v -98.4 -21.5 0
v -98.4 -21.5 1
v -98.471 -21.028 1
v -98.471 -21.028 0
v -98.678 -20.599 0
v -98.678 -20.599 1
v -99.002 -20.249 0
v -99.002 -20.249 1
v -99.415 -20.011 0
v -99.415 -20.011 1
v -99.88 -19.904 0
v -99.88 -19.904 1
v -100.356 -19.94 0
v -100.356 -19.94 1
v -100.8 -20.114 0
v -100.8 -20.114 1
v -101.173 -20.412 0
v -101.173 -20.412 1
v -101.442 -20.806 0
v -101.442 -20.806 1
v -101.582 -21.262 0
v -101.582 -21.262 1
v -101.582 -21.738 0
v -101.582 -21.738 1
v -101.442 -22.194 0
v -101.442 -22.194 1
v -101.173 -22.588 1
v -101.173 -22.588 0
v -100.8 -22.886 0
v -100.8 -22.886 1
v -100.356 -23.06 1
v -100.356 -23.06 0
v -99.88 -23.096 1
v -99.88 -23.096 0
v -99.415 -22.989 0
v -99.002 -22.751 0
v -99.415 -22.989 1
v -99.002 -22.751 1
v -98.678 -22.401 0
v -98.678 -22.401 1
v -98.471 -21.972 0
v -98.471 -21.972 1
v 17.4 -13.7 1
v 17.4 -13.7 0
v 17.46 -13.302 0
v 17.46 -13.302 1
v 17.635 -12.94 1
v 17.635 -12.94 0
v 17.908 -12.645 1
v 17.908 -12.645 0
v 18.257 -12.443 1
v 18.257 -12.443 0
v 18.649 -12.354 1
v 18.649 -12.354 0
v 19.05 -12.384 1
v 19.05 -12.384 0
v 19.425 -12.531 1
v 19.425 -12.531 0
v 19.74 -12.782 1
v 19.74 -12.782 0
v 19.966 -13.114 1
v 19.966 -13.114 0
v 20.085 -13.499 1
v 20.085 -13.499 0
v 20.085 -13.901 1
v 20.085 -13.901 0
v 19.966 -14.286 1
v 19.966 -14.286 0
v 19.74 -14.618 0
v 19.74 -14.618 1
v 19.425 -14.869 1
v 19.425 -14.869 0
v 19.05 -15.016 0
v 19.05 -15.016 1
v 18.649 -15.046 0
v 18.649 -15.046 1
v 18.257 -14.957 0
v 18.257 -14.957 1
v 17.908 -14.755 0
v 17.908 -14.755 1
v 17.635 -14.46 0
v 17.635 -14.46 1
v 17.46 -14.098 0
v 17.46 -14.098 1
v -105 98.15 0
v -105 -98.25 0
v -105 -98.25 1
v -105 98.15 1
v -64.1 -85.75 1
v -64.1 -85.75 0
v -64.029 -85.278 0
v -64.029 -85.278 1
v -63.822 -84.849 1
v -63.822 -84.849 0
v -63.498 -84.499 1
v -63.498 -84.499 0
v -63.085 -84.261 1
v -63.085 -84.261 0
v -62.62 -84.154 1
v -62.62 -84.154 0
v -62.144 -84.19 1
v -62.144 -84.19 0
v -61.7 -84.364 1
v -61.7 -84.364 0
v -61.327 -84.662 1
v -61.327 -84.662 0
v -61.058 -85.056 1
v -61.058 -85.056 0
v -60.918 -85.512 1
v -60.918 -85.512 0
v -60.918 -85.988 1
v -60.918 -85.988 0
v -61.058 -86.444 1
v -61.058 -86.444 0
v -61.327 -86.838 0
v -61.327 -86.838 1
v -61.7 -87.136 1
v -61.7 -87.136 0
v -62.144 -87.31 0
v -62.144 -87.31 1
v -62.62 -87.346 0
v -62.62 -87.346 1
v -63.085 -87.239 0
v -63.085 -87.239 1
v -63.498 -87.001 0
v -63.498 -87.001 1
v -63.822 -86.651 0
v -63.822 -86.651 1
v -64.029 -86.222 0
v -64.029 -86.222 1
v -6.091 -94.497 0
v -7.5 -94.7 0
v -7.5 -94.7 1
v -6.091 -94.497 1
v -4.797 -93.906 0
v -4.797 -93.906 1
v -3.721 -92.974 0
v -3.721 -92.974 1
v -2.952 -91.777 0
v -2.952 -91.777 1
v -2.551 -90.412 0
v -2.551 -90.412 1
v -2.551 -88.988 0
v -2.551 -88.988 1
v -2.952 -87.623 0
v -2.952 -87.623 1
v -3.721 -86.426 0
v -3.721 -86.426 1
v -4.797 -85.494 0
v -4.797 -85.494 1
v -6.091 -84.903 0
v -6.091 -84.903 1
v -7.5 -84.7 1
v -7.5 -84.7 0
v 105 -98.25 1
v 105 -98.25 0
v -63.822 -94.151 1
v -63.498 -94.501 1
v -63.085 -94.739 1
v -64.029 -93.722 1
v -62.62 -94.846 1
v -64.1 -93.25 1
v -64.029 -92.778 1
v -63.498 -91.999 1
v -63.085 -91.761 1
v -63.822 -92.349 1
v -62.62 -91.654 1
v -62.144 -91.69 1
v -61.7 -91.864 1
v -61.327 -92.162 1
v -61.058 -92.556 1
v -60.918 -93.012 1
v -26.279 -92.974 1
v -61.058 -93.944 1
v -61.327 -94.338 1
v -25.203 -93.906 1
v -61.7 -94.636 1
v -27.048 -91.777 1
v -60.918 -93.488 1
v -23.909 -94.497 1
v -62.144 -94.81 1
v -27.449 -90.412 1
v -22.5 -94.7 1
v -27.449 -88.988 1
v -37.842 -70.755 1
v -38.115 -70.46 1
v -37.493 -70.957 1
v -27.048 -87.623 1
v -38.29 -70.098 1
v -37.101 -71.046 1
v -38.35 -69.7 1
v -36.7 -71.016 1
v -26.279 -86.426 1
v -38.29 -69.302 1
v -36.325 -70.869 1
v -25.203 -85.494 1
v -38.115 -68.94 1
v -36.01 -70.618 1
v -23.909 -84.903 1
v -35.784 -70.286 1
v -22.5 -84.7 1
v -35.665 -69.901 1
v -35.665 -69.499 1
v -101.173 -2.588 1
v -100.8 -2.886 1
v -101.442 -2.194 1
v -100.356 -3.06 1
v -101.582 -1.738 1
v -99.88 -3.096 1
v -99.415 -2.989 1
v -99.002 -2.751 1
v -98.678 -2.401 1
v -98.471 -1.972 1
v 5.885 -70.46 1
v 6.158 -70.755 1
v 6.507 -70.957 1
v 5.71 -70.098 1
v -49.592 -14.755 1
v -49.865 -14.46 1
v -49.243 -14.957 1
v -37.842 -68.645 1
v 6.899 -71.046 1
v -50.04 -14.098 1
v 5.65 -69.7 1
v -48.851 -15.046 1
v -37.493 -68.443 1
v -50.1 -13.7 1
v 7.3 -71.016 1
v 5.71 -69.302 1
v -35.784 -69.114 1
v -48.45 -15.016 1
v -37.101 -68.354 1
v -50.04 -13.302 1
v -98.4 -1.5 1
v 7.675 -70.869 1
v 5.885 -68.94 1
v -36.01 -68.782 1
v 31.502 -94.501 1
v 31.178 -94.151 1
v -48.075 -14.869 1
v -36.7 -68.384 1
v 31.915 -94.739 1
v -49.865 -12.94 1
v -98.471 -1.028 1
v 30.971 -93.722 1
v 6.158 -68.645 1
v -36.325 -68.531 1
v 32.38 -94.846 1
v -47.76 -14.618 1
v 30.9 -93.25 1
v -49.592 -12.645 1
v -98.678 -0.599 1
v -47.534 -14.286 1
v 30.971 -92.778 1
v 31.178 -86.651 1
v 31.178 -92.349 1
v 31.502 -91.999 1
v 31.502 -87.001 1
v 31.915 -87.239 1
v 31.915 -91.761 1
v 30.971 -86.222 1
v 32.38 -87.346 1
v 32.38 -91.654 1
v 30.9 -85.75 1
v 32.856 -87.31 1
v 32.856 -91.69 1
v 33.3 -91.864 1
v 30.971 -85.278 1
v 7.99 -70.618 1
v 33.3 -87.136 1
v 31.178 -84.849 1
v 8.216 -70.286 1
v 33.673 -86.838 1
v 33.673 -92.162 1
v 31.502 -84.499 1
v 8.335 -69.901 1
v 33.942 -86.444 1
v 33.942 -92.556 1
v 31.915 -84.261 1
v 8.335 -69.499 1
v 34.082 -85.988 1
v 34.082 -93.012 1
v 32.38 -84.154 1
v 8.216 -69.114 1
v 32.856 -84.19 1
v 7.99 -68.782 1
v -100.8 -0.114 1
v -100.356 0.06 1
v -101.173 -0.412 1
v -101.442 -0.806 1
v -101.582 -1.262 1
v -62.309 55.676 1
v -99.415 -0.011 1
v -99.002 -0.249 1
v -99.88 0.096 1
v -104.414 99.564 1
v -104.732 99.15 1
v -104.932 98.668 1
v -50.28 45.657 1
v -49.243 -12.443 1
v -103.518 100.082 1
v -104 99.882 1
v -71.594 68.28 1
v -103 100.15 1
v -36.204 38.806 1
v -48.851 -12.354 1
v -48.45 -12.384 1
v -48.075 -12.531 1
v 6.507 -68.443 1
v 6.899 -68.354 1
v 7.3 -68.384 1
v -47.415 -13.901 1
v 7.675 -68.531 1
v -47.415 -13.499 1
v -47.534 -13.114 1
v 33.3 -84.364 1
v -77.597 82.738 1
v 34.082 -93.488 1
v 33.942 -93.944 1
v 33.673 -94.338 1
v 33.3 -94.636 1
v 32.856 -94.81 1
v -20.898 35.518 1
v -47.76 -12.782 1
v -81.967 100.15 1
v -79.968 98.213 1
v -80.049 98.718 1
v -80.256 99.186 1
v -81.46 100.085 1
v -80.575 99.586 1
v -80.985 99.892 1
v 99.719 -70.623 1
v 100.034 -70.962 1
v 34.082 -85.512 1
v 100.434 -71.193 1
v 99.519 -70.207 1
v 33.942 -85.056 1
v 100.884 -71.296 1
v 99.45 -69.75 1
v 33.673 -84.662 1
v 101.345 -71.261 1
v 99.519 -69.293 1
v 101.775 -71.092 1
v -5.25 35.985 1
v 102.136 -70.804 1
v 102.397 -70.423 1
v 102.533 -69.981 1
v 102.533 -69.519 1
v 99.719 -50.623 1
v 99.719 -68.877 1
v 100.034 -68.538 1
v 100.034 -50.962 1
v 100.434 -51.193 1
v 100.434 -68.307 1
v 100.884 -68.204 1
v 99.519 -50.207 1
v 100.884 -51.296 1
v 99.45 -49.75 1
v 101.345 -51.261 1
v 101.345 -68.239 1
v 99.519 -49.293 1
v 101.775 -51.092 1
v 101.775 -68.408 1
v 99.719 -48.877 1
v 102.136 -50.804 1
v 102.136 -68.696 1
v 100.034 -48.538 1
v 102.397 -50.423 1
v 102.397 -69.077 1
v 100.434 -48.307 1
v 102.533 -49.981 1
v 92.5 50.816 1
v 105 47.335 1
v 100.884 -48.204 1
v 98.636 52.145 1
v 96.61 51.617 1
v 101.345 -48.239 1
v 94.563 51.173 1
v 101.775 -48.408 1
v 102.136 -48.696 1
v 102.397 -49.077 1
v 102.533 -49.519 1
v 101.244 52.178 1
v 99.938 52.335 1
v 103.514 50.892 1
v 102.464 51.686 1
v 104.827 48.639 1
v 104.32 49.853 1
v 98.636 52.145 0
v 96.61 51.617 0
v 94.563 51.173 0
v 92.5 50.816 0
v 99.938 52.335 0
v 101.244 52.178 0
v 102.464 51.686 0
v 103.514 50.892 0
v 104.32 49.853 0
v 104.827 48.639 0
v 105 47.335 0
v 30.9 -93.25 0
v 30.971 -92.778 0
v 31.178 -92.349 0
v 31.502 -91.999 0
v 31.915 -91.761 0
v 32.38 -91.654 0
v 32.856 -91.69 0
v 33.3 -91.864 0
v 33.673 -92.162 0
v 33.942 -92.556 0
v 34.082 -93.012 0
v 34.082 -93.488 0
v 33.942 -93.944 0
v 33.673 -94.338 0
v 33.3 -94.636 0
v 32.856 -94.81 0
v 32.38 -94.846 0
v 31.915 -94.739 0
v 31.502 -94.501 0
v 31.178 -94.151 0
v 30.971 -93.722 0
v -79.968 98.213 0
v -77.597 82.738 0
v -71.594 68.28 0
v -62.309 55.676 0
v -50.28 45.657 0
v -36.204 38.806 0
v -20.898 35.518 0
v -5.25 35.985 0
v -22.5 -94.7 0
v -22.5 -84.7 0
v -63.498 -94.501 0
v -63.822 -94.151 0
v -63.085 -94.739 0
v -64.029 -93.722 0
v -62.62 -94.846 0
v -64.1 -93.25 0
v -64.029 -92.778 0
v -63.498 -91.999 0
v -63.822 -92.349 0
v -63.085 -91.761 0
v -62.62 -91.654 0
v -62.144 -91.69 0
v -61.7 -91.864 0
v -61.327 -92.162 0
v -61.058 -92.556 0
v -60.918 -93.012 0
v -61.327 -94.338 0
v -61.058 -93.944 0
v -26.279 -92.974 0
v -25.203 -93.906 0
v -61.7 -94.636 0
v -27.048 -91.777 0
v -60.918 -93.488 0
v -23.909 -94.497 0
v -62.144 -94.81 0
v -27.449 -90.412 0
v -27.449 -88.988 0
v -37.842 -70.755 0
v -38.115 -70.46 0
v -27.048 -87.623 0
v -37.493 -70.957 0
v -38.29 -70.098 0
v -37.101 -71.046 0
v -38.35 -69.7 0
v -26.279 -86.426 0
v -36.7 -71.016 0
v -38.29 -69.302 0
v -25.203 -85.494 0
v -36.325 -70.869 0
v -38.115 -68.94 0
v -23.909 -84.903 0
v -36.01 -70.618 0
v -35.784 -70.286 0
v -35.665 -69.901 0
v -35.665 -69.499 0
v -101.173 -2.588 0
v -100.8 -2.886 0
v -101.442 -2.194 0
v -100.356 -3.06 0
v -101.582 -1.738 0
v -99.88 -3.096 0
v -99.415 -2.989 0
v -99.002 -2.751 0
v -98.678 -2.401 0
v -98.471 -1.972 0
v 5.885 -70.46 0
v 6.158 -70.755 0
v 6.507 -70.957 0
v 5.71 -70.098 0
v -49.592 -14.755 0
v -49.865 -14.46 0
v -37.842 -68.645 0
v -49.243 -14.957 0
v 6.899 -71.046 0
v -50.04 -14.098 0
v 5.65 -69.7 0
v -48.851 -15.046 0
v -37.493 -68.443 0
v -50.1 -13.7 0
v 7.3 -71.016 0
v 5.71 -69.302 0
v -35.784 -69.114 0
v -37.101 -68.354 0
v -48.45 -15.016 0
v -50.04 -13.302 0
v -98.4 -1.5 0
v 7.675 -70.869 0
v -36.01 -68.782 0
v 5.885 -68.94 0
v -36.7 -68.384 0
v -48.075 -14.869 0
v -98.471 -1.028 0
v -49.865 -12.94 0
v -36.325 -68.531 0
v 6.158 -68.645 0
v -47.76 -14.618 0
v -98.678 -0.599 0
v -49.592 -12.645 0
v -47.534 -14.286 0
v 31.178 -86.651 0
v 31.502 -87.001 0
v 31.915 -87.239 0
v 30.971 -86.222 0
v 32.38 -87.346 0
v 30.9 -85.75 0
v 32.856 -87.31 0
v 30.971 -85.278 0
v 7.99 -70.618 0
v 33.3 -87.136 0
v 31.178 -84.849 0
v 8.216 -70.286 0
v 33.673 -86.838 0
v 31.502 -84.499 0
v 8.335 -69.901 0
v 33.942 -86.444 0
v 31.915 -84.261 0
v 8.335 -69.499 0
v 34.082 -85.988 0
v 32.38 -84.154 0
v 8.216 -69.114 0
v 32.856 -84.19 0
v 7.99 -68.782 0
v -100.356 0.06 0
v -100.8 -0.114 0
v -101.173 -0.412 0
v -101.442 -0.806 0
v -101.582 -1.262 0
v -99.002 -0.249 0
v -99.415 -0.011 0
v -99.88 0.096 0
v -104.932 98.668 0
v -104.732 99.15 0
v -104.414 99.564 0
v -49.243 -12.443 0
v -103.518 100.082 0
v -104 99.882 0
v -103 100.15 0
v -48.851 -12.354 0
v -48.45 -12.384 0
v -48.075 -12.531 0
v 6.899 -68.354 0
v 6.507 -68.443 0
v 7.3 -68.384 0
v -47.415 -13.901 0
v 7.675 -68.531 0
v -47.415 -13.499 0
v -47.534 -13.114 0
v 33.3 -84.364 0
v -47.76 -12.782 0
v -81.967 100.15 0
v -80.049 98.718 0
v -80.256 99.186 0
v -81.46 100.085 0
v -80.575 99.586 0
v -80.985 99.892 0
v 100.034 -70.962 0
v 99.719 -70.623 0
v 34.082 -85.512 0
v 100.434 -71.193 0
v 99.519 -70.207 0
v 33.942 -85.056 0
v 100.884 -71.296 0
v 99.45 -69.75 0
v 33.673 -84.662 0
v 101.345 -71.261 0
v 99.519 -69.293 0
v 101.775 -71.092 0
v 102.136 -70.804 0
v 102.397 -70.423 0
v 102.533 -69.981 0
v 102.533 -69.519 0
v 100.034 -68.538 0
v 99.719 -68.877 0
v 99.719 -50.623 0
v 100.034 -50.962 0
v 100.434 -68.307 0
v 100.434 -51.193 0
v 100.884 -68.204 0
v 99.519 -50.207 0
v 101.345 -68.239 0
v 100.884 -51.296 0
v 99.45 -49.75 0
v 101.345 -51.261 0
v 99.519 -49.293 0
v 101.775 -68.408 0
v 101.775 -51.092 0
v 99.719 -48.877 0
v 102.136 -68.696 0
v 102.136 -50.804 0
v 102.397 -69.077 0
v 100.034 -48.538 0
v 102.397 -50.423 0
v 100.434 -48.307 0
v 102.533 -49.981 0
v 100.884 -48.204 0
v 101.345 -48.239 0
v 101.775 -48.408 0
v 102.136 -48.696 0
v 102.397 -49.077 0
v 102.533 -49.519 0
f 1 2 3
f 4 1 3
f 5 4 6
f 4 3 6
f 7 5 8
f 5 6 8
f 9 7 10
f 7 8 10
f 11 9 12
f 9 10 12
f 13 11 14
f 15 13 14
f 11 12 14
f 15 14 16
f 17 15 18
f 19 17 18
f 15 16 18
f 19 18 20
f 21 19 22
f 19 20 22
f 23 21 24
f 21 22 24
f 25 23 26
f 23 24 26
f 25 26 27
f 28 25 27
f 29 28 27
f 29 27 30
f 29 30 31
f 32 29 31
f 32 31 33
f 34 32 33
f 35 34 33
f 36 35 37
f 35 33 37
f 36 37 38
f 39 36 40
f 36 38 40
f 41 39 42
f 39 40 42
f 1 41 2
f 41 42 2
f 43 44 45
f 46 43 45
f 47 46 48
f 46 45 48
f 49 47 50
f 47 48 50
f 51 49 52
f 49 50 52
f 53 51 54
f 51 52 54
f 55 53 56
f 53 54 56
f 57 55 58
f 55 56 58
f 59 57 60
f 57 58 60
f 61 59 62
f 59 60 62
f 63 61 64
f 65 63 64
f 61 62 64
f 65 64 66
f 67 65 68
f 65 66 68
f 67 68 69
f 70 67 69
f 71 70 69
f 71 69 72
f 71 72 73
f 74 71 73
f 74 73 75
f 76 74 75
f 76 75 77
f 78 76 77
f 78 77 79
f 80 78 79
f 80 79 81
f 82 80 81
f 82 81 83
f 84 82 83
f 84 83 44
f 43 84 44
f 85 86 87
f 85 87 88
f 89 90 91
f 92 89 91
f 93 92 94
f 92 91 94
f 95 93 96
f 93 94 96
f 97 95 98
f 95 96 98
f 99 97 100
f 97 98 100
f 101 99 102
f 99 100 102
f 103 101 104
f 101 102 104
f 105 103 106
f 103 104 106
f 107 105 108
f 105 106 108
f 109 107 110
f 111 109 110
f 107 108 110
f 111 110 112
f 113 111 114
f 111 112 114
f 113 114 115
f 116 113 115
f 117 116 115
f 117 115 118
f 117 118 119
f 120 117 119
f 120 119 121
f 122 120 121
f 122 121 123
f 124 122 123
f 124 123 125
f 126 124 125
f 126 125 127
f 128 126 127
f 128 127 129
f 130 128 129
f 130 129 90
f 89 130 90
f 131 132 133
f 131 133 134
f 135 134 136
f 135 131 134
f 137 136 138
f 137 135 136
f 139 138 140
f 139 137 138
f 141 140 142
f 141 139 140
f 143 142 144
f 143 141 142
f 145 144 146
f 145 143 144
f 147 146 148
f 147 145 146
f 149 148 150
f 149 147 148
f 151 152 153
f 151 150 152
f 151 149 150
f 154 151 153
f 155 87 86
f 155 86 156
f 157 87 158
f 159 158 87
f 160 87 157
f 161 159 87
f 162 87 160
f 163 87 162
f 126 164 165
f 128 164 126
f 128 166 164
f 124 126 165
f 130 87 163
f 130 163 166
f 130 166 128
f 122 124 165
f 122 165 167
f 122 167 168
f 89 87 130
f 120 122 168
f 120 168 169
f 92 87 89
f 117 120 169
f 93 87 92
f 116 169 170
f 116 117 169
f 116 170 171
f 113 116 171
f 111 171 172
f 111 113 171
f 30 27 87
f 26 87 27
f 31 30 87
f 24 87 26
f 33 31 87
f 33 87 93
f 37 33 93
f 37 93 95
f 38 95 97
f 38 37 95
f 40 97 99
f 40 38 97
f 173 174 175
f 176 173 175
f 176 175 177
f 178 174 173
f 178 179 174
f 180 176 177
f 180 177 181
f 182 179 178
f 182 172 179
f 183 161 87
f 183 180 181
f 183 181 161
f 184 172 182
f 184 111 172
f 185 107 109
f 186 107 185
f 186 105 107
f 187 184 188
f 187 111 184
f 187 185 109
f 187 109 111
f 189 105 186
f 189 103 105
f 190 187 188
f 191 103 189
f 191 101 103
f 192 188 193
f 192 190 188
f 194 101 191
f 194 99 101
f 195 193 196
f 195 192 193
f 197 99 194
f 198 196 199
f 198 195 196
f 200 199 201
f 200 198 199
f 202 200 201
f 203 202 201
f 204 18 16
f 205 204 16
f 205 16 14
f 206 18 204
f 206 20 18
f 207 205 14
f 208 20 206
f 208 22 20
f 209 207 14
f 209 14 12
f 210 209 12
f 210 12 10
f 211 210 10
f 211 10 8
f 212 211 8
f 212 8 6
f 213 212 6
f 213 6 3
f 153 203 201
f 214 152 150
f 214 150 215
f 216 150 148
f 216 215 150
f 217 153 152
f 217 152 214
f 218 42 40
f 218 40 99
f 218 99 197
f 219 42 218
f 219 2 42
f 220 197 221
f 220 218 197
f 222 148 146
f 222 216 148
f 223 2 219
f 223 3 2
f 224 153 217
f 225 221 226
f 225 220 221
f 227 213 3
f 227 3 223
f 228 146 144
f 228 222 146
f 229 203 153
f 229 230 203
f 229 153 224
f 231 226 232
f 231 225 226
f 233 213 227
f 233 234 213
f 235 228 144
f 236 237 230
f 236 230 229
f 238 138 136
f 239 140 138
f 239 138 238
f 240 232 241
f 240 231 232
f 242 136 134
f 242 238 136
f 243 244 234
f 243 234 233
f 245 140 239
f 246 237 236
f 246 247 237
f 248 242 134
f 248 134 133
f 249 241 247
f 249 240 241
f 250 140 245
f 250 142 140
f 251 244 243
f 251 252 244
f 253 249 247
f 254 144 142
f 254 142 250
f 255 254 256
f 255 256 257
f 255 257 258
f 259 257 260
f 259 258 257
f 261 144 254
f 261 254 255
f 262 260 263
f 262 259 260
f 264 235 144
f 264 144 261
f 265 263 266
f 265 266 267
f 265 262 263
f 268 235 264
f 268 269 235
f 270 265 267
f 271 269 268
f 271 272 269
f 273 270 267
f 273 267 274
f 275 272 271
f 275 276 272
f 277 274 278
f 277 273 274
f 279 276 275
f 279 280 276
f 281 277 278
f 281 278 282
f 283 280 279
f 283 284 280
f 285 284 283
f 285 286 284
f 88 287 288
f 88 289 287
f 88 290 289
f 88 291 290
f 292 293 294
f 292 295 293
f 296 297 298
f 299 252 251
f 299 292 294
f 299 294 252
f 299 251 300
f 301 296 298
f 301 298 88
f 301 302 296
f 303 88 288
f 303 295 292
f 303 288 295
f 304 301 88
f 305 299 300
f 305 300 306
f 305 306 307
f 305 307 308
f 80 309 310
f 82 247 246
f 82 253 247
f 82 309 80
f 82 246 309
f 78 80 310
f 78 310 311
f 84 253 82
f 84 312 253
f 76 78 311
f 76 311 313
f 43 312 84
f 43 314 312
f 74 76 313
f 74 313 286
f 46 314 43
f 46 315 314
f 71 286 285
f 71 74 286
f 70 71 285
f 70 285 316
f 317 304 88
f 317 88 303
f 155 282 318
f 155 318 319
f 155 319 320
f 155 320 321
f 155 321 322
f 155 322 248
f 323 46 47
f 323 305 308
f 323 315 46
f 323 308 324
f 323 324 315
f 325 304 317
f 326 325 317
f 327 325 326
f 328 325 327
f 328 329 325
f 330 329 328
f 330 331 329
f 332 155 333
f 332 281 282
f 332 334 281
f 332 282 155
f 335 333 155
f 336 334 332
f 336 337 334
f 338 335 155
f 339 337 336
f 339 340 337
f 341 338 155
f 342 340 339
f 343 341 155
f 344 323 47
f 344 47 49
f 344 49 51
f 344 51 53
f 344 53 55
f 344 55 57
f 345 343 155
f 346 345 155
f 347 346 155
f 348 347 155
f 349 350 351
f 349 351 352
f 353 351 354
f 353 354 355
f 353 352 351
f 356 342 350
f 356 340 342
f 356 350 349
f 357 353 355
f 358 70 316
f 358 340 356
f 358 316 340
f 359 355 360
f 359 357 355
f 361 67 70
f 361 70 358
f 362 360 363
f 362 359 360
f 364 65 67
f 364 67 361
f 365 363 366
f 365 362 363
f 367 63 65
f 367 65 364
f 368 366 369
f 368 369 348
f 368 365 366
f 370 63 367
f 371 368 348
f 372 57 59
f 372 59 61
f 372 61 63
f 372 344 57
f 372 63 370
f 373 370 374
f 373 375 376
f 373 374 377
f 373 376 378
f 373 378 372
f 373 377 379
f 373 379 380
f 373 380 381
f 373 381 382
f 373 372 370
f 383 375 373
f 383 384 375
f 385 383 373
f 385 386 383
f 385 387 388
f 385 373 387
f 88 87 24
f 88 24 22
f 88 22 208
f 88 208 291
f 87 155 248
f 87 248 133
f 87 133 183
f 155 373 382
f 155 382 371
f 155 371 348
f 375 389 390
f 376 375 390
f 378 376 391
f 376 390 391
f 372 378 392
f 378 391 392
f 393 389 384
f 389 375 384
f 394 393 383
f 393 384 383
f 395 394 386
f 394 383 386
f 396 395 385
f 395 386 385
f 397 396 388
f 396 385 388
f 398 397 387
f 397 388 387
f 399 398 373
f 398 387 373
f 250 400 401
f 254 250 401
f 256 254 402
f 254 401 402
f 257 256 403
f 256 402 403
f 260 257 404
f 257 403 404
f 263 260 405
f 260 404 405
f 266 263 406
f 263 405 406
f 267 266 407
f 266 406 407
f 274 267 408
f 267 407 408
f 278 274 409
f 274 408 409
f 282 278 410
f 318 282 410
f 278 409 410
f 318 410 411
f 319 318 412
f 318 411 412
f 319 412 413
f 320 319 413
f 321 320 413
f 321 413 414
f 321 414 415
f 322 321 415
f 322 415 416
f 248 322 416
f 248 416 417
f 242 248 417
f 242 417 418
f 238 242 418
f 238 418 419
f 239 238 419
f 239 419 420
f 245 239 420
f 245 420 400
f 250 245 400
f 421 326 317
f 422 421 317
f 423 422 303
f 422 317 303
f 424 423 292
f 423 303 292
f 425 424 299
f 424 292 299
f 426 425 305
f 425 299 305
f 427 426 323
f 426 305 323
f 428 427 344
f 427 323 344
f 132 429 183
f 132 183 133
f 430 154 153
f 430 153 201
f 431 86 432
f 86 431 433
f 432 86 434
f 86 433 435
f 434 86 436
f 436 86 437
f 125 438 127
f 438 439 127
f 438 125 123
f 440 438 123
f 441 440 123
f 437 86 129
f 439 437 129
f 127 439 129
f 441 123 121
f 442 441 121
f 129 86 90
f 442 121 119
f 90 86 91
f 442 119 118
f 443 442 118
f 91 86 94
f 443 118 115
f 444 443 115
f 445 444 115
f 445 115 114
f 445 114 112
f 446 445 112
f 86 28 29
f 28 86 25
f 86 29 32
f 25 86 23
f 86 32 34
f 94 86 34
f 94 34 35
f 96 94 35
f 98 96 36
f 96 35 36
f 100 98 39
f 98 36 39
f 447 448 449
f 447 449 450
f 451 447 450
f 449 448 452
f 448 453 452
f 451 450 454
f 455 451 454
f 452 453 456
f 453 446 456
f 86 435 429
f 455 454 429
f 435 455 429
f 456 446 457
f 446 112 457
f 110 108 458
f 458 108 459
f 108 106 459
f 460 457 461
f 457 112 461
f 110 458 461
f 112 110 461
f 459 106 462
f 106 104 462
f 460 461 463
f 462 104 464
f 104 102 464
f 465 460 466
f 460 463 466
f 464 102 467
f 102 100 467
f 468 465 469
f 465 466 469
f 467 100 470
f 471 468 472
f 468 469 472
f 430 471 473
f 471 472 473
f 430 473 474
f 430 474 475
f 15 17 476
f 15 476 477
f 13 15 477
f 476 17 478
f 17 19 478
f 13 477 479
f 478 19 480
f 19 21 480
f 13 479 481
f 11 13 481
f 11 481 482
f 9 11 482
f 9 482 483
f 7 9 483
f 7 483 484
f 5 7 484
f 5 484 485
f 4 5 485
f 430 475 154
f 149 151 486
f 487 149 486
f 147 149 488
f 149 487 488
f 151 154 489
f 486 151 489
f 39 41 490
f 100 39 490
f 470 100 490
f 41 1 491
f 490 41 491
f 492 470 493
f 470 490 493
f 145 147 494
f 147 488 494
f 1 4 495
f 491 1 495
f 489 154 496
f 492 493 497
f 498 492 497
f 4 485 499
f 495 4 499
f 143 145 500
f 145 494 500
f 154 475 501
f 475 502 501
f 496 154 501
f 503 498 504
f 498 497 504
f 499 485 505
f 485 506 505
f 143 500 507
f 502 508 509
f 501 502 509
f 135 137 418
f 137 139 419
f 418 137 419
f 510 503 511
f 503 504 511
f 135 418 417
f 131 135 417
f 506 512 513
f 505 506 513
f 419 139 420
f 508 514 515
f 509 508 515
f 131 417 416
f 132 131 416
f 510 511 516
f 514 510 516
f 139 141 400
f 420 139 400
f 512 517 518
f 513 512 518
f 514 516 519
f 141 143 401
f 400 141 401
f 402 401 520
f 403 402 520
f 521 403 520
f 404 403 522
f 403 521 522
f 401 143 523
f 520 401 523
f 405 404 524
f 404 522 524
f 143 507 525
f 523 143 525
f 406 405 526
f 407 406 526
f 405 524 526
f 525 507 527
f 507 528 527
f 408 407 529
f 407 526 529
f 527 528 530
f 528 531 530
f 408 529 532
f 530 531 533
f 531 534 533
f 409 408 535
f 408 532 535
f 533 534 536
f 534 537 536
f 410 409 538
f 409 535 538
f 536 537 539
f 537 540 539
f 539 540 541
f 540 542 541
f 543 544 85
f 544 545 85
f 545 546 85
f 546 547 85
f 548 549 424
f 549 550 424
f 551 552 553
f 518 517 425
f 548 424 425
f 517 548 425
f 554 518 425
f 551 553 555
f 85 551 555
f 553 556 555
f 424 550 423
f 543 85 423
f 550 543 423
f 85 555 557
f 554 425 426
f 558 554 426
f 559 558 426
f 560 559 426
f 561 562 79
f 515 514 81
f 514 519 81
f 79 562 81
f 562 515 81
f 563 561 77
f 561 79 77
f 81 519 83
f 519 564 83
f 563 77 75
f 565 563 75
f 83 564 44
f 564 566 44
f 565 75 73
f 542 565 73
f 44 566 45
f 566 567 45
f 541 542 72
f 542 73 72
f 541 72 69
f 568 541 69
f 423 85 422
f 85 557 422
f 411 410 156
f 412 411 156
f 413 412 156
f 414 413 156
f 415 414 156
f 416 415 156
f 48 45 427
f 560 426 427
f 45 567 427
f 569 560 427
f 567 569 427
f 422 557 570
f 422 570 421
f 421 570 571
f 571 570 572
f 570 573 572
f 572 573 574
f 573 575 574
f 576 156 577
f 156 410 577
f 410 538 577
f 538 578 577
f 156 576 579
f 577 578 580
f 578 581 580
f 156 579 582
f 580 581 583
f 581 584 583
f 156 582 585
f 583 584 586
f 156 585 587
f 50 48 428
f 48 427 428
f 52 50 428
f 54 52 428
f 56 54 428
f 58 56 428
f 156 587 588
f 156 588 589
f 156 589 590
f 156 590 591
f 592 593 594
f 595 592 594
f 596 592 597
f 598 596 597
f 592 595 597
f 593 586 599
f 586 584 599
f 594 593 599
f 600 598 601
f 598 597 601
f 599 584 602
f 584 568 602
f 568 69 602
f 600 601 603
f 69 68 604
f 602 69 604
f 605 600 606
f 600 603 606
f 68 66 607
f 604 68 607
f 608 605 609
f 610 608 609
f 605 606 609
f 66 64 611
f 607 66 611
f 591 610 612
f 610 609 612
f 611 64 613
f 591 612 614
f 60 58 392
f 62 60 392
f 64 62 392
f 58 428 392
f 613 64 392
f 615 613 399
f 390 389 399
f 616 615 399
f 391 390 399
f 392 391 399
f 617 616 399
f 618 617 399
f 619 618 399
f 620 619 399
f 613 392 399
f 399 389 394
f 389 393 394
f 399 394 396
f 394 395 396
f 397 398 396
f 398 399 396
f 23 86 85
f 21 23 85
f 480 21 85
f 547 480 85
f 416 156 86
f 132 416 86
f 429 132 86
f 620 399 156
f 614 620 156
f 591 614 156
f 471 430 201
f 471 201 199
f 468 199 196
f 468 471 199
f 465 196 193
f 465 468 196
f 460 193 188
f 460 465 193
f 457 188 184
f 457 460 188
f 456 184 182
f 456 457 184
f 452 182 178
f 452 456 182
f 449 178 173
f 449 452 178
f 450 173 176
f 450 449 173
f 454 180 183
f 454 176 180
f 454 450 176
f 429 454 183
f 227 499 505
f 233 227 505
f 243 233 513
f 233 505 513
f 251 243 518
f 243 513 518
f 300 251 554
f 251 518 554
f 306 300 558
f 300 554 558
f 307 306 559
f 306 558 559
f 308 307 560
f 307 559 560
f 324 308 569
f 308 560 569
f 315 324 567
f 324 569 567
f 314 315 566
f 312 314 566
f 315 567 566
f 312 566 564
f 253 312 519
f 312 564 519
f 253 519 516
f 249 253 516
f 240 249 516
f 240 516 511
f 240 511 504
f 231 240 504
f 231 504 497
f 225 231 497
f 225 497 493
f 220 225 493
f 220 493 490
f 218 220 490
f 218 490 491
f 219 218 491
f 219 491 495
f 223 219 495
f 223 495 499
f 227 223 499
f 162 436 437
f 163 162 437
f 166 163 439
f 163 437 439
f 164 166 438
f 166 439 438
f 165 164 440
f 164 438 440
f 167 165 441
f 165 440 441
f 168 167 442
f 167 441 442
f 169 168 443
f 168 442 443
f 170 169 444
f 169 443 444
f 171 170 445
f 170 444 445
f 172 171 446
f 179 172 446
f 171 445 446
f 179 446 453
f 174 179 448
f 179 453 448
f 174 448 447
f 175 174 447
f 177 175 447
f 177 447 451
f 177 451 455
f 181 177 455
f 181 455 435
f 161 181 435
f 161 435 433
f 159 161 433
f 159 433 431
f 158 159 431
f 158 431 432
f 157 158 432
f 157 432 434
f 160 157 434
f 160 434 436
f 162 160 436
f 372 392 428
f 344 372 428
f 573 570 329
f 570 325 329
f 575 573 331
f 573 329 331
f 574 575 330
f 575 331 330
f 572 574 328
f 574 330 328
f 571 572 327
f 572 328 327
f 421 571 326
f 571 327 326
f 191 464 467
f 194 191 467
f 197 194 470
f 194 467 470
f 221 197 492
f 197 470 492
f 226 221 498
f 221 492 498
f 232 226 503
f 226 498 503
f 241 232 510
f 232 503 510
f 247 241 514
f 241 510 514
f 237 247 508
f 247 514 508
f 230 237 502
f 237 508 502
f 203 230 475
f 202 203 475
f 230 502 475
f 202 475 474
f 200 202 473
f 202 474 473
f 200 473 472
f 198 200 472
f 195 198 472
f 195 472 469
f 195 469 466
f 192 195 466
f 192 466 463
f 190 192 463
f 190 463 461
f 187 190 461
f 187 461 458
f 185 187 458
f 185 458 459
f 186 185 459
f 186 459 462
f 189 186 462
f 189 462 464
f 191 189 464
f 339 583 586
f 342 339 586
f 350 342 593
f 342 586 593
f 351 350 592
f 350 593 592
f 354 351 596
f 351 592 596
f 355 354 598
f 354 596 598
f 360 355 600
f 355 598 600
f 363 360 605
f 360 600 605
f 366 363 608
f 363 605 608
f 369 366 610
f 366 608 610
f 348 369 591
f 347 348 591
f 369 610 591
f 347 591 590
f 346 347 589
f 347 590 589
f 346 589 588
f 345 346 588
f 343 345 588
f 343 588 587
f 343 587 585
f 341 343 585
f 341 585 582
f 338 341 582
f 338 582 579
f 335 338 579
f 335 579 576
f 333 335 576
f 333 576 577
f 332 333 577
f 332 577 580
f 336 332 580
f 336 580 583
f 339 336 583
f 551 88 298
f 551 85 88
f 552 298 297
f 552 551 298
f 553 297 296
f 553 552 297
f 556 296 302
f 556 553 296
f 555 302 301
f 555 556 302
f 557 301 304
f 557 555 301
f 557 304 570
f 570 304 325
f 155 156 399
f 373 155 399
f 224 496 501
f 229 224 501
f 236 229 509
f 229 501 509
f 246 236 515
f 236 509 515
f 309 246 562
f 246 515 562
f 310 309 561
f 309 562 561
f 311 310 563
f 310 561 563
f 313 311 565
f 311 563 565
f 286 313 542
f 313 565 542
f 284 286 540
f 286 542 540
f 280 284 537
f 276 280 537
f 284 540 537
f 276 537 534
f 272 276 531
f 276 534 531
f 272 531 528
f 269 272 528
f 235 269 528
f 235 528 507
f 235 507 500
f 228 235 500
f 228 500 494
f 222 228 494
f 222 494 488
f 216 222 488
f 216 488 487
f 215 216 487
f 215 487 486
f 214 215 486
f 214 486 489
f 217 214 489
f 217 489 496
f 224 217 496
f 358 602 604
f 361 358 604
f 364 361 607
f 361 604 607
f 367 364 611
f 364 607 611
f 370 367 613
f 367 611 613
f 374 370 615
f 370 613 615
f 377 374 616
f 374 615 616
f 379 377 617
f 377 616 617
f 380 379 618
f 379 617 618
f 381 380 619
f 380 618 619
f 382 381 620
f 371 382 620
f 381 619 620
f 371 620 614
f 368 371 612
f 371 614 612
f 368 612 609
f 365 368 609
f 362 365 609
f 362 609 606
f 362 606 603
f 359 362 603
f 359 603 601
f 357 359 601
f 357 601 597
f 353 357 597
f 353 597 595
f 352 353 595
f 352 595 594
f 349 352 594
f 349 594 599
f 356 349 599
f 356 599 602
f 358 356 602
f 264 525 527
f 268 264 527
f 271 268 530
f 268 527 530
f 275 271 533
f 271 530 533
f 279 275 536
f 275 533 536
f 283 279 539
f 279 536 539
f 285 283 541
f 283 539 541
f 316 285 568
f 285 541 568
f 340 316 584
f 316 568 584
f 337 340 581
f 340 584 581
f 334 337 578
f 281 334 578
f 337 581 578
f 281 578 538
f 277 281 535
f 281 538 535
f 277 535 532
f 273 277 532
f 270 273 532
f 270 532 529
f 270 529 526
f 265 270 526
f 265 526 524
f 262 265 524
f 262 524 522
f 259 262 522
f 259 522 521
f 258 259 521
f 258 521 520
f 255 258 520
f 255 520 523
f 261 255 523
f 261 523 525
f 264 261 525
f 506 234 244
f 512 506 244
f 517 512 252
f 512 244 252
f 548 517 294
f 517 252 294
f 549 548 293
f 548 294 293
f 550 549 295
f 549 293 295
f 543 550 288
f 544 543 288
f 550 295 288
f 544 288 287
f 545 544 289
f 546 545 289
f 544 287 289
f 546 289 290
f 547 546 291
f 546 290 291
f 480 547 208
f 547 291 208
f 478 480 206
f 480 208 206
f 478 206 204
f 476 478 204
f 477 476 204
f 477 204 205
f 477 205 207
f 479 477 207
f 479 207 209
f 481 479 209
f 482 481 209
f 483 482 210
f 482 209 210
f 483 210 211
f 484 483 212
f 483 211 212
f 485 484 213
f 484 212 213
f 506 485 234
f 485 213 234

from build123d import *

# Parameters (mm, degrees)
SKETCH_1_W           = 210
SKETCH_1_H           = 233
EXTRUDE_1_DEPTH      = 1
SKETCH_2_R           = 65
CUT_EXTRUDE_1_DEPTH  = 2
SKETCH_3_W           = 210
SKETCH_3_H           = 16.25
CUT_EXTRUDE_2_DEPTH  = 2
SKETCH_4_W           = 210
SKETCH_4_H           = 0.1
CUT_EXTRUDE_3_DEPTH  = 2
CUT_EXTRUDE_4_DEPTH  = 2
SKETCH_8_R           = 1.6
CUT_EXTRUDE_6_DEPTH  = 1
SKETCH_12_R          = 1.35
CUT_EXTRUDE_9_DEPTH  = 10
CUT_EXTRUDE_10_DEPTH = 10
FILLET_3_R           = 2
SKETCH_15_R          = 1.6
CUT_EXTRUDE_12_DEPTH = 10
SKETCH_17_R          = 1.55
CUT_EXTRUDE_13_DEPTH = 10
CUT_EXTRUDE_14_DEPTH = 10
FILLET_6_R           = 5
SKETCH_24_W          = 210
SKETCH_24_H          = 18.25
CUT_EXTRUDE_18_DEPTH = 10


with BuildPart() as part:
    # 草图1 → 凸台-拉伸1 (new body)
    with BuildSketch(Plane.XY):
        Rectangle(SKETCH_1_W, SKETCH_1_H)
    extrude(amount=EXTRUDE_1_DEPTH)

    # 草图2 → 切除-拉伸1 (cut)
    with BuildSketch(Plane.XY.offset(1)):
        with Locations((-15, 100.25)):
            Circle(SKETCH_2_R)
    extrude(amount=-CUT_EXTRUDE_1_DEPTH, mode=Mode.SUBTRACT)

    # 草图3 → 切除-拉伸2 (cut)
    with BuildSketch(Plane.XY.offset(1)):
        with Locations((0, 108.375)):
            Rectangle(SKETCH_3_W, SKETCH_3_H)
    extrude(amount=-CUT_EXTRUDE_2_DEPTH, mode=Mode.SUBTRACT)

    # 草图4 → 切除-拉伸3 (cut)
    with BuildSketch(Plane.XY.offset(1)):
        with Locations((0, 100.2)):
            Rectangle(SKETCH_4_W, SKETCH_4_H)
    extrude(amount=-CUT_EXTRUDE_3_DEPTH, mode=Mode.SUBTRACT)

    # 草图5 → 切除-拉伸4 (cut)
    with BuildSketch(Plane.XY.offset(1)):
        with BuildLine():
            Line((4.5, 38.243951908), (95.5, 66.86212795))
            ThreePointArc((95.5, 66.86212795), (105.715966735, 128.460790883), (50.000008252, 100.274034742))
            Line((50.000008252, 100.274034742), (49.999923077, 100.15))
            ThreePointArc((49.999923077, 100.15), (37.375079452, 61.755181486), (4.5, 38.243951908))
        make_face()
    extrude(amount=-CUT_EXTRUDE_4_DEPTH, mode=Mode.SUBTRACT)

    # 草图8 → 切除-拉伸6 (cut)
    with BuildSketch(Plane.XY.offset(1)):
        with Locations((-100, -21.5)):
            Circle(SKETCH_8_R)
        with Locations((-100, -1.5)):
            Circle(SKETCH_8_R)
    extrude(amount=-CUT_EXTRUDE_6_DEPTH, mode=Mode.SUBTRACT)

    # 草图12 → 切除-拉伸9 (cut)
    with BuildSketch(Plane(origin=(0, 0, 0), x_dir=(-1, 0, 0), z_dir=(0, 0, -1))):
        with Locations((-18.75, -13.7)):
            Circle(SKETCH_12_R)
        with Locations((48.75, -13.7)):
            Circle(SKETCH_12_R)
        with Locations((-7, -69.7)):
            Circle(SKETCH_12_R)
        with Locations((37, -69.7)):
            Circle(SKETCH_12_R)
    extrude(amount=-CUT_EXTRUDE_9_DEPTH, mode=Mode.SUBTRACT)

    # 草图13 → 切除-拉伸10 (cut)
    with BuildSketch(Plane(origin=(0, 0, 0), x_dir=(-1, 0, 0), z_dir=(0, 0, -1))):
        with BuildLine():
            Line((7.5, -84.7), (22.5, -84.7))
            ThreePointArc((22.5, -84.7), (27.5, -89.7), (22.5, -94.7))
            Line((22.5, -94.7), (7.5, -94.7))
            ThreePointArc((7.5, -94.7), (2.5, -89.7), (7.5, -84.7))
        make_face()
    extrude(amount=-CUT_EXTRUDE_10_DEPTH, mode=Mode.SUBTRACT)

    # 圆角3
    fillet_3_edges = [part.edges().sort_by_distance(p)[0] for p in [
        (105, 71.527186767, 0.5),
        (-79.999923077, 100.15, 0.5),
        (-105, 100.15, 0.5),
        (105, -116.5, 0.5),
        (-105, -116.5, 0.5),
    ]]
    fillet(fillet_3_edges, radius=FILLET_3_R)

    # 草图15 → 切除-拉伸12 (cut)
    with BuildSketch(Plane(origin=(0, 0, 0), x_dir=(-1, 0, 0), z_dir=(0, 0, -1))):
        with Locations((-32.5, -85.75)):
            Circle(SKETCH_15_R)
        with Locations((-32.5, -93.25)):
            Circle(SKETCH_15_R)
        with Locations((62.5, -85.75)):
            Circle(SKETCH_15_R)
        with Locations((62.5, -93.25)):
            Circle(SKETCH_15_R)
    extrude(amount=-CUT_EXTRUDE_12_DEPTH, mode=Mode.SUBTRACT)

    # 草图17 → 切除-拉伸13 (cut)
    with BuildSketch(Plane(origin=(0, 0, 0), x_dir=(-1, 0, 0), z_dir=(0, 0, -1))):
        with Locations((-101, -49.75)):
            Circle(SKETCH_17_R)
        with Locations((-101, -69.75)):
            Circle(SKETCH_17_R)
    extrude(amount=-CUT_EXTRUDE_13_DEPTH, mode=Mode.SUBTRACT)

    # 草图18 → 切除-拉伸14 (cut)
    with BuildSketch(Plane(origin=(0, 0, 0), x_dir=(-1, 0, 0), z_dir=(0, 0, -1))):
        with BuildLine():
            Line((-92.5, 50.815700167), (5.25, 35.985410217))
            Line((5.25, 35.985410217), (-105, 79.42424305))
            Line((-105, 79.42424305), (-105, 54.42424305))
            ThreePointArc((-105, 54.42424305), (-98.86787278, 52.211660056), (-92.5, 50.815700167))
        make_face()
    extrude(amount=-CUT_EXTRUDE_14_DEPTH, mode=Mode.SUBTRACT)

    # 圆角6
    fillet_6_edges = [part.edges().sort_by_distance(p)[0] for p in [
        (105, 54.42424305, 0.5),
    ]]
    fillet(fillet_6_edges, radius=FILLET_6_R)

    # 草图24 → 切除-拉伸18 (cut)
    with BuildSketch(Plane.XY.offset(1)):
        with Locations((0, -107.375)):
            Rectangle(SKETCH_24_W, SKETCH_24_H)
    extrude(amount=-CUT_EXTRUDE_18_DEPTH, mode=Mode.SUBTRACT)


solid = part.part
